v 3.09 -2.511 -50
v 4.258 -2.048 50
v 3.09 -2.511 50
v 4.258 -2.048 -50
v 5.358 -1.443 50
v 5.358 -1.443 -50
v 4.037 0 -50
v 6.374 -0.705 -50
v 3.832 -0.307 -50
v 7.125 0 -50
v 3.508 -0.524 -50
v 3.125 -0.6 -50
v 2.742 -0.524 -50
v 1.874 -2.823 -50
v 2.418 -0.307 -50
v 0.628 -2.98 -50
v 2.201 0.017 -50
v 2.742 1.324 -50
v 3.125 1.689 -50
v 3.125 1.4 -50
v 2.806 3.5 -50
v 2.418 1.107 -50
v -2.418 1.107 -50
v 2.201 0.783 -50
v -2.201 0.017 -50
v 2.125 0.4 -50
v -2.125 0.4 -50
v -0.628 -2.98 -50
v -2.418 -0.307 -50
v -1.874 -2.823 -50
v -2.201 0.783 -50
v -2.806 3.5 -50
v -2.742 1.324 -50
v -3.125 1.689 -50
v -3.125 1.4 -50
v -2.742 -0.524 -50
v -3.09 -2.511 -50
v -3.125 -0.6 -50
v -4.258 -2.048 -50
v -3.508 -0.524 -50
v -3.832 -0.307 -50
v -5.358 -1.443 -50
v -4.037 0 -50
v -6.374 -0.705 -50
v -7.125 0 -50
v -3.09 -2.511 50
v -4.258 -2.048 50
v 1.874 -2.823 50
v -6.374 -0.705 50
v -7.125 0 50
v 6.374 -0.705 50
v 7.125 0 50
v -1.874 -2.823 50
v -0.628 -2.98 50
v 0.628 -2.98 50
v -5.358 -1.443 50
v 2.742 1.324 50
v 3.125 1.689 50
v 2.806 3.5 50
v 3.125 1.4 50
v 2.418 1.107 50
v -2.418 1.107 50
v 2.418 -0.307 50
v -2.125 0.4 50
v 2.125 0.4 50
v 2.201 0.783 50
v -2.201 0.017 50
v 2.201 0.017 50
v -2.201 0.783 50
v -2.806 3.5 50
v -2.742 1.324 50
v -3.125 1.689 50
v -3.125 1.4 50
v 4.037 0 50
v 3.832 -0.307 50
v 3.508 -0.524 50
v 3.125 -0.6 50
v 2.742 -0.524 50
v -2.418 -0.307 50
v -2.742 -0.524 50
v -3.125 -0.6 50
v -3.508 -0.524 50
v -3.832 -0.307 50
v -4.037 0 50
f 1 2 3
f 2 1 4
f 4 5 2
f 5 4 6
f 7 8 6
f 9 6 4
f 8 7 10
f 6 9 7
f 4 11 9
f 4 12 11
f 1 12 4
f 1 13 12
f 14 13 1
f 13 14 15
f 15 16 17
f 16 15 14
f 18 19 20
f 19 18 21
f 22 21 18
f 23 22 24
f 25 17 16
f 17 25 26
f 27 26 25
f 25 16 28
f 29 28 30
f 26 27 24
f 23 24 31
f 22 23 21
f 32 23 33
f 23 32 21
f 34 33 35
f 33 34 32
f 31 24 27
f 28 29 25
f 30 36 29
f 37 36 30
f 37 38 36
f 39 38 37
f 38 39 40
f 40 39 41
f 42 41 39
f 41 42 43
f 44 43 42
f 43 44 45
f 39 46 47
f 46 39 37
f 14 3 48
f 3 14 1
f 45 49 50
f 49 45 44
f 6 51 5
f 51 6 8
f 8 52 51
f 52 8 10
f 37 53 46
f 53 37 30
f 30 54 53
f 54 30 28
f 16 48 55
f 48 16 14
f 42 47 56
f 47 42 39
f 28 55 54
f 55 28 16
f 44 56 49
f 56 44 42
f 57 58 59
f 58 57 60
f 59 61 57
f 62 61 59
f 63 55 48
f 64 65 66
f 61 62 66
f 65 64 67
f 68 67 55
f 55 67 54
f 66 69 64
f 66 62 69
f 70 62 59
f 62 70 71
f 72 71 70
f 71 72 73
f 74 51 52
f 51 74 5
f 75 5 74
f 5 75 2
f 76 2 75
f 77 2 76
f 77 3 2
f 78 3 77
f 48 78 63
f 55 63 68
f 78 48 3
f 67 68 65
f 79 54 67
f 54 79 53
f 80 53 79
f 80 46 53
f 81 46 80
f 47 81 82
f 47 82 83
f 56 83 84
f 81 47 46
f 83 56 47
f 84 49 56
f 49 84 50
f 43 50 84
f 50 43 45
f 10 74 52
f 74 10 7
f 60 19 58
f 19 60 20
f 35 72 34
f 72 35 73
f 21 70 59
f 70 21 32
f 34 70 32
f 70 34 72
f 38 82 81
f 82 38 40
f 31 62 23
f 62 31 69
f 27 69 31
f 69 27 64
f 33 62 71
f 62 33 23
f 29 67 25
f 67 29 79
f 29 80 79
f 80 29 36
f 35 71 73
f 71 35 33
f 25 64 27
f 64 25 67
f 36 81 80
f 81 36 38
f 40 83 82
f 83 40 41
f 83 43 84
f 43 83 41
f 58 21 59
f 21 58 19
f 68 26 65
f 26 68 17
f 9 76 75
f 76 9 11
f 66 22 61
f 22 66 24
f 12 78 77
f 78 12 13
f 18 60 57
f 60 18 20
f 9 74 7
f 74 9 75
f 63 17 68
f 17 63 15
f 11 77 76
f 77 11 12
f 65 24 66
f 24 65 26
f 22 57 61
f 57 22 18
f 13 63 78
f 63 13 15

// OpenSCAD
//The height of the cover
height=100;




holeSize=6.25;


depth=3.5;

difference()
{
    union()
    {
        difference()
        {
            translate([0,7,0]) cylinder(r=10, h=height, center=true, $fn=50);
            translate([0,10,0]) cube([20,20,height+1], center=true);
        }
        translate([0,depth/2, 0]) cube([holeSize, 3.5, height], center=true);
    } 
    for (x=[-1,1])
    {
        translate([x*5.45,2.9,0]) rotate([0,0,x*10]) cube([5,5,height+1], center=true);
        translate([x*holeSize/2,0.4,0]) cylinder(r=1, h=height+1, center=true, $fn=16);
    }
}
